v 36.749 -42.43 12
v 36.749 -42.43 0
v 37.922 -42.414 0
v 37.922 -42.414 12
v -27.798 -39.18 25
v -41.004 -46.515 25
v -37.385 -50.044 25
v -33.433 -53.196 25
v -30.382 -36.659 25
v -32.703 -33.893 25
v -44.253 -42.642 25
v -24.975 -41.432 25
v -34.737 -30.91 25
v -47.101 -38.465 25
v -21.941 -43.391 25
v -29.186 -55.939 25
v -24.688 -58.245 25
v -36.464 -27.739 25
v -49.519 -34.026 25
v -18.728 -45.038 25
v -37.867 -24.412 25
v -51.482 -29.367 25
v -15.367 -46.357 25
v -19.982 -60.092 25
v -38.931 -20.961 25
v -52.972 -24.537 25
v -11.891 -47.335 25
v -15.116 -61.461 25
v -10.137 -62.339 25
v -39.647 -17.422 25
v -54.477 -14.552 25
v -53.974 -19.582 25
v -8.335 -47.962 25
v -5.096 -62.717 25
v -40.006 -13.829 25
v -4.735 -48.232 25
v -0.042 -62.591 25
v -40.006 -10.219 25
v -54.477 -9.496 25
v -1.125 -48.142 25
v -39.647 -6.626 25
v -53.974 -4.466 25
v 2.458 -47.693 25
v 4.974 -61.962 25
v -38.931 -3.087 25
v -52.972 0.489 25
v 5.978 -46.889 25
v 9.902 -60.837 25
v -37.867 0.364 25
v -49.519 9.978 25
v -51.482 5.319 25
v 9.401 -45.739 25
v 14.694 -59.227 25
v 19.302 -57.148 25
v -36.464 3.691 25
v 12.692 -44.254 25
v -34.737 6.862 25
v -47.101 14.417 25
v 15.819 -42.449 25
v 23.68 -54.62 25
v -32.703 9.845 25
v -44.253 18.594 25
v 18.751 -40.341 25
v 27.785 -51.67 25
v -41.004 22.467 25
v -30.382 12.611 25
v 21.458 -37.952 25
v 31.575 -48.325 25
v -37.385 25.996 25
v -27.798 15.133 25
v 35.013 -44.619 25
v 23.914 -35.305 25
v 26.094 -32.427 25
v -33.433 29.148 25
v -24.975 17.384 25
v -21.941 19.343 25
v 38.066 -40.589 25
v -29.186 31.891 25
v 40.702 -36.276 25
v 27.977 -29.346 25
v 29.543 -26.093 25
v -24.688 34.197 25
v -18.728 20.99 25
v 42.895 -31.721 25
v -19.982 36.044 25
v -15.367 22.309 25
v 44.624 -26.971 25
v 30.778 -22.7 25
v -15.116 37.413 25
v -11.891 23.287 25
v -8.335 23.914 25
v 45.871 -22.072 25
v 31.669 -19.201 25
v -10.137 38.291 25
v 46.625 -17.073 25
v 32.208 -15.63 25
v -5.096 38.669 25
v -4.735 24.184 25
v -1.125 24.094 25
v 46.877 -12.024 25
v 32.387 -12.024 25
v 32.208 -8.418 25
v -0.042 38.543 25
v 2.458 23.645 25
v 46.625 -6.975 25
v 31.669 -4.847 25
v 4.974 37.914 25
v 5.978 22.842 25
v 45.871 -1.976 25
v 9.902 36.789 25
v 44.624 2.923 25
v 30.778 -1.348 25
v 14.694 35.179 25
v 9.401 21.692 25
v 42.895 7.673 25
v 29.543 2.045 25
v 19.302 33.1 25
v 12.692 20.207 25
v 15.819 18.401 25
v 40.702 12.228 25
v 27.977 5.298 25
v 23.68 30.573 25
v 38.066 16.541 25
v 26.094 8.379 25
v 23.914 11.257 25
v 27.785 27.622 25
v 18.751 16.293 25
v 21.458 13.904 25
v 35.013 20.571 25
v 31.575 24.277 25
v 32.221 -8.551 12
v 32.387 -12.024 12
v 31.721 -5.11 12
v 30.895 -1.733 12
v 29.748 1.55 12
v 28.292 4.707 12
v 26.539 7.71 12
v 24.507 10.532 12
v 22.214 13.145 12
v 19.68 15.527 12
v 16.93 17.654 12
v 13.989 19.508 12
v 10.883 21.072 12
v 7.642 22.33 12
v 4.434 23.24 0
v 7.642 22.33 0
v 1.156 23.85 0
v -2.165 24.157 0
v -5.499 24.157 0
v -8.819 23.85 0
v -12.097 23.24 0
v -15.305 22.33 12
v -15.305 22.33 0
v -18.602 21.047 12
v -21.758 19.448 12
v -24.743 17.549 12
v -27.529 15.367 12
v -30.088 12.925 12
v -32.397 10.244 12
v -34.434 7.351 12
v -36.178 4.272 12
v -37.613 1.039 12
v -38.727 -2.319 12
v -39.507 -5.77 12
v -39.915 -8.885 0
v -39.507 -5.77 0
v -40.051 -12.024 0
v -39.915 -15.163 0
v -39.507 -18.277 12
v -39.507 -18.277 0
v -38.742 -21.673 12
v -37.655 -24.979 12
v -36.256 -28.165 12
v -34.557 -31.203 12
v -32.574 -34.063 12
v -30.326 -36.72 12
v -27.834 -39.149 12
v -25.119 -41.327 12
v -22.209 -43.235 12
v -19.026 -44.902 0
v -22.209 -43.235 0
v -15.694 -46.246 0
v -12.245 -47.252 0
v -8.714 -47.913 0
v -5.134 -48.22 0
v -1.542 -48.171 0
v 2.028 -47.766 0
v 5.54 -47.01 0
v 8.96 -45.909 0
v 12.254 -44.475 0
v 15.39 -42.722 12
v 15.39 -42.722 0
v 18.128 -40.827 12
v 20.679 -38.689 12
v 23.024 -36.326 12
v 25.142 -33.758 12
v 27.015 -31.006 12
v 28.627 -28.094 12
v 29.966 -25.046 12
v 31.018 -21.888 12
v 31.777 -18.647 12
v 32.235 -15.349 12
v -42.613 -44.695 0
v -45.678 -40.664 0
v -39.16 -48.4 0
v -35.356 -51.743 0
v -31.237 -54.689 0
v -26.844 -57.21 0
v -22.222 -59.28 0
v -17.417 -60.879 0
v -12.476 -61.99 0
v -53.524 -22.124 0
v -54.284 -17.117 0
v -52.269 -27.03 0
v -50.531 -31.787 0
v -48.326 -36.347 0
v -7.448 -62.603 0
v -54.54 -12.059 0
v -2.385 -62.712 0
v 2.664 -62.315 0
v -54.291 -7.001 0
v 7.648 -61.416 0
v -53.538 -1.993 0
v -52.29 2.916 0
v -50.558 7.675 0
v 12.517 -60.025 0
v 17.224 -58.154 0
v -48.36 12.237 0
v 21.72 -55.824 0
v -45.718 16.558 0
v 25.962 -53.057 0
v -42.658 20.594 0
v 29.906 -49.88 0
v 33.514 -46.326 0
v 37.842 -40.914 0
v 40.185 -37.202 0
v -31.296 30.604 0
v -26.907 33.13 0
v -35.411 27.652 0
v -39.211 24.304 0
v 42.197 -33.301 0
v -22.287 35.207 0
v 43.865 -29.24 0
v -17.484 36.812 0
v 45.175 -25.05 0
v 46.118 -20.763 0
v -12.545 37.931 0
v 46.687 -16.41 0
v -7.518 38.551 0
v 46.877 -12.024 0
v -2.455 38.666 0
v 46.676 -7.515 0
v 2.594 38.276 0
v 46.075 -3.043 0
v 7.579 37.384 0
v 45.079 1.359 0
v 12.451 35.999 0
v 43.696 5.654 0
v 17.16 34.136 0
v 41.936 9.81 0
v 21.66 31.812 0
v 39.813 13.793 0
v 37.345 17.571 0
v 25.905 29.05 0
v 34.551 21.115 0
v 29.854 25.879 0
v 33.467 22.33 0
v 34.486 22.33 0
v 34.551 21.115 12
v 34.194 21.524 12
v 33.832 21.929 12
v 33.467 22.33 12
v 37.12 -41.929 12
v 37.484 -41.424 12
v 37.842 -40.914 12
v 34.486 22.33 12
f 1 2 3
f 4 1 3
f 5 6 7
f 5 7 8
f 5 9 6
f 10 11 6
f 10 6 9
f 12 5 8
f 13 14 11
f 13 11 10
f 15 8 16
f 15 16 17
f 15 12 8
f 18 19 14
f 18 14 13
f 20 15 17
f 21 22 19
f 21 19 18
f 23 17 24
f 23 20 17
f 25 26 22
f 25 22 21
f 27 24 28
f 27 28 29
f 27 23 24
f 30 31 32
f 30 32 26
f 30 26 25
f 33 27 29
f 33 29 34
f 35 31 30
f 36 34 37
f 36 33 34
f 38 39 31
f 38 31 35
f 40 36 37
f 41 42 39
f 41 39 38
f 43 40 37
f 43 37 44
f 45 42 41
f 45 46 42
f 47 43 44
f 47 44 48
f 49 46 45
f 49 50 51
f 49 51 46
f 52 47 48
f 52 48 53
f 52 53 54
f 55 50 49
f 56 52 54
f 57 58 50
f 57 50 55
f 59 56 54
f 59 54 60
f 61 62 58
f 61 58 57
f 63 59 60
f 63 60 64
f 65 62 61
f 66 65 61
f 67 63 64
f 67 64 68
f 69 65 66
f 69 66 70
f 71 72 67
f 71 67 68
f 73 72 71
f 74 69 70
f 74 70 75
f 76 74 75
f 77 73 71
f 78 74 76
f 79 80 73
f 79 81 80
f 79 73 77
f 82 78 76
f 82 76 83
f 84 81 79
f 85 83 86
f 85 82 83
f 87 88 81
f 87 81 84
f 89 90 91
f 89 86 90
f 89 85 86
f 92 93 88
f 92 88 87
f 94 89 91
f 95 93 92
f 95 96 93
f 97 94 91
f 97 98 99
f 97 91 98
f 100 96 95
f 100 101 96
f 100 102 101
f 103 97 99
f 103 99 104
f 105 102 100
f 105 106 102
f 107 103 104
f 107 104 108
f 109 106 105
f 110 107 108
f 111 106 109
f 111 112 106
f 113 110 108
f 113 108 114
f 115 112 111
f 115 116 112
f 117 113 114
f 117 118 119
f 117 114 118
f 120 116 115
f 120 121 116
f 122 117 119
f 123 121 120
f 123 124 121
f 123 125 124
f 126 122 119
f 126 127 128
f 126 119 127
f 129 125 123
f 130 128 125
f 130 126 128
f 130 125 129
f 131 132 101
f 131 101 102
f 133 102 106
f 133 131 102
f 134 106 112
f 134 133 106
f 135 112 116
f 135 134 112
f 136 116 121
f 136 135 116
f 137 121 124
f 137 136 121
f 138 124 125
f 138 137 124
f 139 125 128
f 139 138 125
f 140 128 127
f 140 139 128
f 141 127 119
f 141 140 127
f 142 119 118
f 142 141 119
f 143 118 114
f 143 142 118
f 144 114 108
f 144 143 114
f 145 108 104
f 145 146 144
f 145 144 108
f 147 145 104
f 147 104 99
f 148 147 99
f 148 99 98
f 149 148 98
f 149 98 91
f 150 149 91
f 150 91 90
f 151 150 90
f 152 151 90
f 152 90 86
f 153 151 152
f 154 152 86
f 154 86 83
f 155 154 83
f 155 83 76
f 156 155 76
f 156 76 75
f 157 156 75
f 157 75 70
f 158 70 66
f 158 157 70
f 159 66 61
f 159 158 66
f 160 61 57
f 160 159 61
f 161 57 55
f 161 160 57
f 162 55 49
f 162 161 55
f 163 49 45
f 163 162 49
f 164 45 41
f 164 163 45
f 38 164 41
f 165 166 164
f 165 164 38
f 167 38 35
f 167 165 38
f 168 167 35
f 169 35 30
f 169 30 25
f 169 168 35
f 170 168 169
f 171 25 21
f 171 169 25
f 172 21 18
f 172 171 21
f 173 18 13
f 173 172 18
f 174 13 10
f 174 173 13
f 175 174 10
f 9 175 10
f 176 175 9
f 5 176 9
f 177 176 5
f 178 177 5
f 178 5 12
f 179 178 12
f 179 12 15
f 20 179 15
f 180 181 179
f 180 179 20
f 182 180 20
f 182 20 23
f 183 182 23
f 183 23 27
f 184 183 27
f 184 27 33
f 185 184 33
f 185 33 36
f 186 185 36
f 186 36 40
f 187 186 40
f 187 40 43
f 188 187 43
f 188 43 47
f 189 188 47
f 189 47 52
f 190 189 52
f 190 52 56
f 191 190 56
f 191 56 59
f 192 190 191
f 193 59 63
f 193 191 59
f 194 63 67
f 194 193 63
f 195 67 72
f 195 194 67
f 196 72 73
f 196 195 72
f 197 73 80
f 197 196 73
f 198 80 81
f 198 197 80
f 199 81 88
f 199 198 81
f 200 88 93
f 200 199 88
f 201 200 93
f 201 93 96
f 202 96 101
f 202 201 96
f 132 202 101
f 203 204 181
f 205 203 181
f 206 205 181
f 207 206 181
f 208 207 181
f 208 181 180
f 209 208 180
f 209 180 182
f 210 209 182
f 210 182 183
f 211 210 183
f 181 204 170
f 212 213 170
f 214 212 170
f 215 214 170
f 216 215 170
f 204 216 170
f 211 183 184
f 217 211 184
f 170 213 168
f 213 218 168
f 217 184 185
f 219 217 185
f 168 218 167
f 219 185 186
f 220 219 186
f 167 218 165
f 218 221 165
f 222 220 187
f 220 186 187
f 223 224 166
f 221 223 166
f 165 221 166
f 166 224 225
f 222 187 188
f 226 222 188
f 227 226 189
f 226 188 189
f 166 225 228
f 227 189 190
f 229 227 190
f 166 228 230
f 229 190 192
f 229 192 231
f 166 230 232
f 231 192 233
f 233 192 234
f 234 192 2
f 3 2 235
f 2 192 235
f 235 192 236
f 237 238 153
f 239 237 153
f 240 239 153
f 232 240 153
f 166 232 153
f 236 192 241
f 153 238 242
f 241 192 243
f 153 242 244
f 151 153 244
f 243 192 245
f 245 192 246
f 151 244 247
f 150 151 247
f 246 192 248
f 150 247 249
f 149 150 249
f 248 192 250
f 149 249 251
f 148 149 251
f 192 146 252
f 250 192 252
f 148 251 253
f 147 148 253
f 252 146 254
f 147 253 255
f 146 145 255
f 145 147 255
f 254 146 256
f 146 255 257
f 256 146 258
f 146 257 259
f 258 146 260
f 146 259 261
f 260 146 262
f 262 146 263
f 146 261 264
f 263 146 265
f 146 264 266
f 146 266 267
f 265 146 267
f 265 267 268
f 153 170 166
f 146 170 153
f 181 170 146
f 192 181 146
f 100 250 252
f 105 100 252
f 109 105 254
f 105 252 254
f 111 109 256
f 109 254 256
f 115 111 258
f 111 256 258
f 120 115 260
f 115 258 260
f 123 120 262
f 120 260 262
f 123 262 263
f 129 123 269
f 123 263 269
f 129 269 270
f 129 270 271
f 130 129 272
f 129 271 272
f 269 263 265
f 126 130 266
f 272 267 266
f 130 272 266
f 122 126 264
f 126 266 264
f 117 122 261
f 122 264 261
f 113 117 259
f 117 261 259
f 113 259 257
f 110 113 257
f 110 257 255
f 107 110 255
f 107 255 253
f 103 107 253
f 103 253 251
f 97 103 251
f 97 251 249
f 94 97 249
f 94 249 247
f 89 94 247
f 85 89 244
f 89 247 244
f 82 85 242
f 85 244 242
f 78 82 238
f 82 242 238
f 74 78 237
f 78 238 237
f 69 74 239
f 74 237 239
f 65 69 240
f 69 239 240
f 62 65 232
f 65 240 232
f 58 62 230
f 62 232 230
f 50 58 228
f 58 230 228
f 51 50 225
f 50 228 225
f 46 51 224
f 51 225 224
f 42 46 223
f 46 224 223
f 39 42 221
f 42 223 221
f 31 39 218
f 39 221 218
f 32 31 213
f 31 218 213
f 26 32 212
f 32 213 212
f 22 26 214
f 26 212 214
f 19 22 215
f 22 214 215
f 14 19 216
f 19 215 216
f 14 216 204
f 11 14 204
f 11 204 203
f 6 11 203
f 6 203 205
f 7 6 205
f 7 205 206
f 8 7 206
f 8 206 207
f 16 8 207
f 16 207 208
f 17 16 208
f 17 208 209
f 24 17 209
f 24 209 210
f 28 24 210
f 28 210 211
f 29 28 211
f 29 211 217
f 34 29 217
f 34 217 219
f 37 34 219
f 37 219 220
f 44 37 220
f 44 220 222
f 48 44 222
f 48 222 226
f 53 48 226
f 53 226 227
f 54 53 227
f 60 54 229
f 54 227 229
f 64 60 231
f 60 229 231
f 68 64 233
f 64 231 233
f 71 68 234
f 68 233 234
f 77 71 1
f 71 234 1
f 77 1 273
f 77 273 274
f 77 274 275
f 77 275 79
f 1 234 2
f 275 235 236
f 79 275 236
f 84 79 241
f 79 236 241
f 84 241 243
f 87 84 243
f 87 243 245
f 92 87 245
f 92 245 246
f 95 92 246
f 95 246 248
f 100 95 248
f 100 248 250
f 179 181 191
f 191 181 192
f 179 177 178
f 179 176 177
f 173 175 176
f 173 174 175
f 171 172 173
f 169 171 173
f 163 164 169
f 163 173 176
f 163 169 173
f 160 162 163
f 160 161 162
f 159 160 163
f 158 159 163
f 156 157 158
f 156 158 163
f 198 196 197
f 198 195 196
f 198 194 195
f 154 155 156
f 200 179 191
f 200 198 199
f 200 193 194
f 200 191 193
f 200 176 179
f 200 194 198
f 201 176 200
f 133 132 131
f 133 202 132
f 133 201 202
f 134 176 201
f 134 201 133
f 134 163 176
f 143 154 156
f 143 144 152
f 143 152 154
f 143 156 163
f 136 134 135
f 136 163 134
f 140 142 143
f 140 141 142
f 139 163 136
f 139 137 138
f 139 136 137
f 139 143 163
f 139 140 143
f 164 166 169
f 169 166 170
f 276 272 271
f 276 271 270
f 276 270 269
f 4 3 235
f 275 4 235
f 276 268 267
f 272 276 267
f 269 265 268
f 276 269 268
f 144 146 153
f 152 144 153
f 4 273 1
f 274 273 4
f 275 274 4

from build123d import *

# Parameters (mm, degrees)
F1_DEPTH = 12
F2_R     = 50.708657
F2_R_2   = 36.219288
F3_DEPTH = 25


with BuildPart() as f1:
    # F0 (on Top) → F1 (new body)
    with BuildSketch(Plane.XY):
        Polygon((34.48616, 22.330118), (-39.507132, 22.330118), (-39.507132, -43.471057), (37.921563, -42.414013), align=None)
    extrude(amount=F1_DEPTH)

    # F2 (on Top) → F3 (join)
    with BuildSketch(Plane.XY):
        with Locations((-3.831795, -12.02391)):
            Circle(F2_R)
        with Locations((-3.831795, -12.02391)):
            Circle(F2_R_2, mode=Mode.SUBTRACT)
    extrude(amount=F3_DEPTH)


solid = f1.part
